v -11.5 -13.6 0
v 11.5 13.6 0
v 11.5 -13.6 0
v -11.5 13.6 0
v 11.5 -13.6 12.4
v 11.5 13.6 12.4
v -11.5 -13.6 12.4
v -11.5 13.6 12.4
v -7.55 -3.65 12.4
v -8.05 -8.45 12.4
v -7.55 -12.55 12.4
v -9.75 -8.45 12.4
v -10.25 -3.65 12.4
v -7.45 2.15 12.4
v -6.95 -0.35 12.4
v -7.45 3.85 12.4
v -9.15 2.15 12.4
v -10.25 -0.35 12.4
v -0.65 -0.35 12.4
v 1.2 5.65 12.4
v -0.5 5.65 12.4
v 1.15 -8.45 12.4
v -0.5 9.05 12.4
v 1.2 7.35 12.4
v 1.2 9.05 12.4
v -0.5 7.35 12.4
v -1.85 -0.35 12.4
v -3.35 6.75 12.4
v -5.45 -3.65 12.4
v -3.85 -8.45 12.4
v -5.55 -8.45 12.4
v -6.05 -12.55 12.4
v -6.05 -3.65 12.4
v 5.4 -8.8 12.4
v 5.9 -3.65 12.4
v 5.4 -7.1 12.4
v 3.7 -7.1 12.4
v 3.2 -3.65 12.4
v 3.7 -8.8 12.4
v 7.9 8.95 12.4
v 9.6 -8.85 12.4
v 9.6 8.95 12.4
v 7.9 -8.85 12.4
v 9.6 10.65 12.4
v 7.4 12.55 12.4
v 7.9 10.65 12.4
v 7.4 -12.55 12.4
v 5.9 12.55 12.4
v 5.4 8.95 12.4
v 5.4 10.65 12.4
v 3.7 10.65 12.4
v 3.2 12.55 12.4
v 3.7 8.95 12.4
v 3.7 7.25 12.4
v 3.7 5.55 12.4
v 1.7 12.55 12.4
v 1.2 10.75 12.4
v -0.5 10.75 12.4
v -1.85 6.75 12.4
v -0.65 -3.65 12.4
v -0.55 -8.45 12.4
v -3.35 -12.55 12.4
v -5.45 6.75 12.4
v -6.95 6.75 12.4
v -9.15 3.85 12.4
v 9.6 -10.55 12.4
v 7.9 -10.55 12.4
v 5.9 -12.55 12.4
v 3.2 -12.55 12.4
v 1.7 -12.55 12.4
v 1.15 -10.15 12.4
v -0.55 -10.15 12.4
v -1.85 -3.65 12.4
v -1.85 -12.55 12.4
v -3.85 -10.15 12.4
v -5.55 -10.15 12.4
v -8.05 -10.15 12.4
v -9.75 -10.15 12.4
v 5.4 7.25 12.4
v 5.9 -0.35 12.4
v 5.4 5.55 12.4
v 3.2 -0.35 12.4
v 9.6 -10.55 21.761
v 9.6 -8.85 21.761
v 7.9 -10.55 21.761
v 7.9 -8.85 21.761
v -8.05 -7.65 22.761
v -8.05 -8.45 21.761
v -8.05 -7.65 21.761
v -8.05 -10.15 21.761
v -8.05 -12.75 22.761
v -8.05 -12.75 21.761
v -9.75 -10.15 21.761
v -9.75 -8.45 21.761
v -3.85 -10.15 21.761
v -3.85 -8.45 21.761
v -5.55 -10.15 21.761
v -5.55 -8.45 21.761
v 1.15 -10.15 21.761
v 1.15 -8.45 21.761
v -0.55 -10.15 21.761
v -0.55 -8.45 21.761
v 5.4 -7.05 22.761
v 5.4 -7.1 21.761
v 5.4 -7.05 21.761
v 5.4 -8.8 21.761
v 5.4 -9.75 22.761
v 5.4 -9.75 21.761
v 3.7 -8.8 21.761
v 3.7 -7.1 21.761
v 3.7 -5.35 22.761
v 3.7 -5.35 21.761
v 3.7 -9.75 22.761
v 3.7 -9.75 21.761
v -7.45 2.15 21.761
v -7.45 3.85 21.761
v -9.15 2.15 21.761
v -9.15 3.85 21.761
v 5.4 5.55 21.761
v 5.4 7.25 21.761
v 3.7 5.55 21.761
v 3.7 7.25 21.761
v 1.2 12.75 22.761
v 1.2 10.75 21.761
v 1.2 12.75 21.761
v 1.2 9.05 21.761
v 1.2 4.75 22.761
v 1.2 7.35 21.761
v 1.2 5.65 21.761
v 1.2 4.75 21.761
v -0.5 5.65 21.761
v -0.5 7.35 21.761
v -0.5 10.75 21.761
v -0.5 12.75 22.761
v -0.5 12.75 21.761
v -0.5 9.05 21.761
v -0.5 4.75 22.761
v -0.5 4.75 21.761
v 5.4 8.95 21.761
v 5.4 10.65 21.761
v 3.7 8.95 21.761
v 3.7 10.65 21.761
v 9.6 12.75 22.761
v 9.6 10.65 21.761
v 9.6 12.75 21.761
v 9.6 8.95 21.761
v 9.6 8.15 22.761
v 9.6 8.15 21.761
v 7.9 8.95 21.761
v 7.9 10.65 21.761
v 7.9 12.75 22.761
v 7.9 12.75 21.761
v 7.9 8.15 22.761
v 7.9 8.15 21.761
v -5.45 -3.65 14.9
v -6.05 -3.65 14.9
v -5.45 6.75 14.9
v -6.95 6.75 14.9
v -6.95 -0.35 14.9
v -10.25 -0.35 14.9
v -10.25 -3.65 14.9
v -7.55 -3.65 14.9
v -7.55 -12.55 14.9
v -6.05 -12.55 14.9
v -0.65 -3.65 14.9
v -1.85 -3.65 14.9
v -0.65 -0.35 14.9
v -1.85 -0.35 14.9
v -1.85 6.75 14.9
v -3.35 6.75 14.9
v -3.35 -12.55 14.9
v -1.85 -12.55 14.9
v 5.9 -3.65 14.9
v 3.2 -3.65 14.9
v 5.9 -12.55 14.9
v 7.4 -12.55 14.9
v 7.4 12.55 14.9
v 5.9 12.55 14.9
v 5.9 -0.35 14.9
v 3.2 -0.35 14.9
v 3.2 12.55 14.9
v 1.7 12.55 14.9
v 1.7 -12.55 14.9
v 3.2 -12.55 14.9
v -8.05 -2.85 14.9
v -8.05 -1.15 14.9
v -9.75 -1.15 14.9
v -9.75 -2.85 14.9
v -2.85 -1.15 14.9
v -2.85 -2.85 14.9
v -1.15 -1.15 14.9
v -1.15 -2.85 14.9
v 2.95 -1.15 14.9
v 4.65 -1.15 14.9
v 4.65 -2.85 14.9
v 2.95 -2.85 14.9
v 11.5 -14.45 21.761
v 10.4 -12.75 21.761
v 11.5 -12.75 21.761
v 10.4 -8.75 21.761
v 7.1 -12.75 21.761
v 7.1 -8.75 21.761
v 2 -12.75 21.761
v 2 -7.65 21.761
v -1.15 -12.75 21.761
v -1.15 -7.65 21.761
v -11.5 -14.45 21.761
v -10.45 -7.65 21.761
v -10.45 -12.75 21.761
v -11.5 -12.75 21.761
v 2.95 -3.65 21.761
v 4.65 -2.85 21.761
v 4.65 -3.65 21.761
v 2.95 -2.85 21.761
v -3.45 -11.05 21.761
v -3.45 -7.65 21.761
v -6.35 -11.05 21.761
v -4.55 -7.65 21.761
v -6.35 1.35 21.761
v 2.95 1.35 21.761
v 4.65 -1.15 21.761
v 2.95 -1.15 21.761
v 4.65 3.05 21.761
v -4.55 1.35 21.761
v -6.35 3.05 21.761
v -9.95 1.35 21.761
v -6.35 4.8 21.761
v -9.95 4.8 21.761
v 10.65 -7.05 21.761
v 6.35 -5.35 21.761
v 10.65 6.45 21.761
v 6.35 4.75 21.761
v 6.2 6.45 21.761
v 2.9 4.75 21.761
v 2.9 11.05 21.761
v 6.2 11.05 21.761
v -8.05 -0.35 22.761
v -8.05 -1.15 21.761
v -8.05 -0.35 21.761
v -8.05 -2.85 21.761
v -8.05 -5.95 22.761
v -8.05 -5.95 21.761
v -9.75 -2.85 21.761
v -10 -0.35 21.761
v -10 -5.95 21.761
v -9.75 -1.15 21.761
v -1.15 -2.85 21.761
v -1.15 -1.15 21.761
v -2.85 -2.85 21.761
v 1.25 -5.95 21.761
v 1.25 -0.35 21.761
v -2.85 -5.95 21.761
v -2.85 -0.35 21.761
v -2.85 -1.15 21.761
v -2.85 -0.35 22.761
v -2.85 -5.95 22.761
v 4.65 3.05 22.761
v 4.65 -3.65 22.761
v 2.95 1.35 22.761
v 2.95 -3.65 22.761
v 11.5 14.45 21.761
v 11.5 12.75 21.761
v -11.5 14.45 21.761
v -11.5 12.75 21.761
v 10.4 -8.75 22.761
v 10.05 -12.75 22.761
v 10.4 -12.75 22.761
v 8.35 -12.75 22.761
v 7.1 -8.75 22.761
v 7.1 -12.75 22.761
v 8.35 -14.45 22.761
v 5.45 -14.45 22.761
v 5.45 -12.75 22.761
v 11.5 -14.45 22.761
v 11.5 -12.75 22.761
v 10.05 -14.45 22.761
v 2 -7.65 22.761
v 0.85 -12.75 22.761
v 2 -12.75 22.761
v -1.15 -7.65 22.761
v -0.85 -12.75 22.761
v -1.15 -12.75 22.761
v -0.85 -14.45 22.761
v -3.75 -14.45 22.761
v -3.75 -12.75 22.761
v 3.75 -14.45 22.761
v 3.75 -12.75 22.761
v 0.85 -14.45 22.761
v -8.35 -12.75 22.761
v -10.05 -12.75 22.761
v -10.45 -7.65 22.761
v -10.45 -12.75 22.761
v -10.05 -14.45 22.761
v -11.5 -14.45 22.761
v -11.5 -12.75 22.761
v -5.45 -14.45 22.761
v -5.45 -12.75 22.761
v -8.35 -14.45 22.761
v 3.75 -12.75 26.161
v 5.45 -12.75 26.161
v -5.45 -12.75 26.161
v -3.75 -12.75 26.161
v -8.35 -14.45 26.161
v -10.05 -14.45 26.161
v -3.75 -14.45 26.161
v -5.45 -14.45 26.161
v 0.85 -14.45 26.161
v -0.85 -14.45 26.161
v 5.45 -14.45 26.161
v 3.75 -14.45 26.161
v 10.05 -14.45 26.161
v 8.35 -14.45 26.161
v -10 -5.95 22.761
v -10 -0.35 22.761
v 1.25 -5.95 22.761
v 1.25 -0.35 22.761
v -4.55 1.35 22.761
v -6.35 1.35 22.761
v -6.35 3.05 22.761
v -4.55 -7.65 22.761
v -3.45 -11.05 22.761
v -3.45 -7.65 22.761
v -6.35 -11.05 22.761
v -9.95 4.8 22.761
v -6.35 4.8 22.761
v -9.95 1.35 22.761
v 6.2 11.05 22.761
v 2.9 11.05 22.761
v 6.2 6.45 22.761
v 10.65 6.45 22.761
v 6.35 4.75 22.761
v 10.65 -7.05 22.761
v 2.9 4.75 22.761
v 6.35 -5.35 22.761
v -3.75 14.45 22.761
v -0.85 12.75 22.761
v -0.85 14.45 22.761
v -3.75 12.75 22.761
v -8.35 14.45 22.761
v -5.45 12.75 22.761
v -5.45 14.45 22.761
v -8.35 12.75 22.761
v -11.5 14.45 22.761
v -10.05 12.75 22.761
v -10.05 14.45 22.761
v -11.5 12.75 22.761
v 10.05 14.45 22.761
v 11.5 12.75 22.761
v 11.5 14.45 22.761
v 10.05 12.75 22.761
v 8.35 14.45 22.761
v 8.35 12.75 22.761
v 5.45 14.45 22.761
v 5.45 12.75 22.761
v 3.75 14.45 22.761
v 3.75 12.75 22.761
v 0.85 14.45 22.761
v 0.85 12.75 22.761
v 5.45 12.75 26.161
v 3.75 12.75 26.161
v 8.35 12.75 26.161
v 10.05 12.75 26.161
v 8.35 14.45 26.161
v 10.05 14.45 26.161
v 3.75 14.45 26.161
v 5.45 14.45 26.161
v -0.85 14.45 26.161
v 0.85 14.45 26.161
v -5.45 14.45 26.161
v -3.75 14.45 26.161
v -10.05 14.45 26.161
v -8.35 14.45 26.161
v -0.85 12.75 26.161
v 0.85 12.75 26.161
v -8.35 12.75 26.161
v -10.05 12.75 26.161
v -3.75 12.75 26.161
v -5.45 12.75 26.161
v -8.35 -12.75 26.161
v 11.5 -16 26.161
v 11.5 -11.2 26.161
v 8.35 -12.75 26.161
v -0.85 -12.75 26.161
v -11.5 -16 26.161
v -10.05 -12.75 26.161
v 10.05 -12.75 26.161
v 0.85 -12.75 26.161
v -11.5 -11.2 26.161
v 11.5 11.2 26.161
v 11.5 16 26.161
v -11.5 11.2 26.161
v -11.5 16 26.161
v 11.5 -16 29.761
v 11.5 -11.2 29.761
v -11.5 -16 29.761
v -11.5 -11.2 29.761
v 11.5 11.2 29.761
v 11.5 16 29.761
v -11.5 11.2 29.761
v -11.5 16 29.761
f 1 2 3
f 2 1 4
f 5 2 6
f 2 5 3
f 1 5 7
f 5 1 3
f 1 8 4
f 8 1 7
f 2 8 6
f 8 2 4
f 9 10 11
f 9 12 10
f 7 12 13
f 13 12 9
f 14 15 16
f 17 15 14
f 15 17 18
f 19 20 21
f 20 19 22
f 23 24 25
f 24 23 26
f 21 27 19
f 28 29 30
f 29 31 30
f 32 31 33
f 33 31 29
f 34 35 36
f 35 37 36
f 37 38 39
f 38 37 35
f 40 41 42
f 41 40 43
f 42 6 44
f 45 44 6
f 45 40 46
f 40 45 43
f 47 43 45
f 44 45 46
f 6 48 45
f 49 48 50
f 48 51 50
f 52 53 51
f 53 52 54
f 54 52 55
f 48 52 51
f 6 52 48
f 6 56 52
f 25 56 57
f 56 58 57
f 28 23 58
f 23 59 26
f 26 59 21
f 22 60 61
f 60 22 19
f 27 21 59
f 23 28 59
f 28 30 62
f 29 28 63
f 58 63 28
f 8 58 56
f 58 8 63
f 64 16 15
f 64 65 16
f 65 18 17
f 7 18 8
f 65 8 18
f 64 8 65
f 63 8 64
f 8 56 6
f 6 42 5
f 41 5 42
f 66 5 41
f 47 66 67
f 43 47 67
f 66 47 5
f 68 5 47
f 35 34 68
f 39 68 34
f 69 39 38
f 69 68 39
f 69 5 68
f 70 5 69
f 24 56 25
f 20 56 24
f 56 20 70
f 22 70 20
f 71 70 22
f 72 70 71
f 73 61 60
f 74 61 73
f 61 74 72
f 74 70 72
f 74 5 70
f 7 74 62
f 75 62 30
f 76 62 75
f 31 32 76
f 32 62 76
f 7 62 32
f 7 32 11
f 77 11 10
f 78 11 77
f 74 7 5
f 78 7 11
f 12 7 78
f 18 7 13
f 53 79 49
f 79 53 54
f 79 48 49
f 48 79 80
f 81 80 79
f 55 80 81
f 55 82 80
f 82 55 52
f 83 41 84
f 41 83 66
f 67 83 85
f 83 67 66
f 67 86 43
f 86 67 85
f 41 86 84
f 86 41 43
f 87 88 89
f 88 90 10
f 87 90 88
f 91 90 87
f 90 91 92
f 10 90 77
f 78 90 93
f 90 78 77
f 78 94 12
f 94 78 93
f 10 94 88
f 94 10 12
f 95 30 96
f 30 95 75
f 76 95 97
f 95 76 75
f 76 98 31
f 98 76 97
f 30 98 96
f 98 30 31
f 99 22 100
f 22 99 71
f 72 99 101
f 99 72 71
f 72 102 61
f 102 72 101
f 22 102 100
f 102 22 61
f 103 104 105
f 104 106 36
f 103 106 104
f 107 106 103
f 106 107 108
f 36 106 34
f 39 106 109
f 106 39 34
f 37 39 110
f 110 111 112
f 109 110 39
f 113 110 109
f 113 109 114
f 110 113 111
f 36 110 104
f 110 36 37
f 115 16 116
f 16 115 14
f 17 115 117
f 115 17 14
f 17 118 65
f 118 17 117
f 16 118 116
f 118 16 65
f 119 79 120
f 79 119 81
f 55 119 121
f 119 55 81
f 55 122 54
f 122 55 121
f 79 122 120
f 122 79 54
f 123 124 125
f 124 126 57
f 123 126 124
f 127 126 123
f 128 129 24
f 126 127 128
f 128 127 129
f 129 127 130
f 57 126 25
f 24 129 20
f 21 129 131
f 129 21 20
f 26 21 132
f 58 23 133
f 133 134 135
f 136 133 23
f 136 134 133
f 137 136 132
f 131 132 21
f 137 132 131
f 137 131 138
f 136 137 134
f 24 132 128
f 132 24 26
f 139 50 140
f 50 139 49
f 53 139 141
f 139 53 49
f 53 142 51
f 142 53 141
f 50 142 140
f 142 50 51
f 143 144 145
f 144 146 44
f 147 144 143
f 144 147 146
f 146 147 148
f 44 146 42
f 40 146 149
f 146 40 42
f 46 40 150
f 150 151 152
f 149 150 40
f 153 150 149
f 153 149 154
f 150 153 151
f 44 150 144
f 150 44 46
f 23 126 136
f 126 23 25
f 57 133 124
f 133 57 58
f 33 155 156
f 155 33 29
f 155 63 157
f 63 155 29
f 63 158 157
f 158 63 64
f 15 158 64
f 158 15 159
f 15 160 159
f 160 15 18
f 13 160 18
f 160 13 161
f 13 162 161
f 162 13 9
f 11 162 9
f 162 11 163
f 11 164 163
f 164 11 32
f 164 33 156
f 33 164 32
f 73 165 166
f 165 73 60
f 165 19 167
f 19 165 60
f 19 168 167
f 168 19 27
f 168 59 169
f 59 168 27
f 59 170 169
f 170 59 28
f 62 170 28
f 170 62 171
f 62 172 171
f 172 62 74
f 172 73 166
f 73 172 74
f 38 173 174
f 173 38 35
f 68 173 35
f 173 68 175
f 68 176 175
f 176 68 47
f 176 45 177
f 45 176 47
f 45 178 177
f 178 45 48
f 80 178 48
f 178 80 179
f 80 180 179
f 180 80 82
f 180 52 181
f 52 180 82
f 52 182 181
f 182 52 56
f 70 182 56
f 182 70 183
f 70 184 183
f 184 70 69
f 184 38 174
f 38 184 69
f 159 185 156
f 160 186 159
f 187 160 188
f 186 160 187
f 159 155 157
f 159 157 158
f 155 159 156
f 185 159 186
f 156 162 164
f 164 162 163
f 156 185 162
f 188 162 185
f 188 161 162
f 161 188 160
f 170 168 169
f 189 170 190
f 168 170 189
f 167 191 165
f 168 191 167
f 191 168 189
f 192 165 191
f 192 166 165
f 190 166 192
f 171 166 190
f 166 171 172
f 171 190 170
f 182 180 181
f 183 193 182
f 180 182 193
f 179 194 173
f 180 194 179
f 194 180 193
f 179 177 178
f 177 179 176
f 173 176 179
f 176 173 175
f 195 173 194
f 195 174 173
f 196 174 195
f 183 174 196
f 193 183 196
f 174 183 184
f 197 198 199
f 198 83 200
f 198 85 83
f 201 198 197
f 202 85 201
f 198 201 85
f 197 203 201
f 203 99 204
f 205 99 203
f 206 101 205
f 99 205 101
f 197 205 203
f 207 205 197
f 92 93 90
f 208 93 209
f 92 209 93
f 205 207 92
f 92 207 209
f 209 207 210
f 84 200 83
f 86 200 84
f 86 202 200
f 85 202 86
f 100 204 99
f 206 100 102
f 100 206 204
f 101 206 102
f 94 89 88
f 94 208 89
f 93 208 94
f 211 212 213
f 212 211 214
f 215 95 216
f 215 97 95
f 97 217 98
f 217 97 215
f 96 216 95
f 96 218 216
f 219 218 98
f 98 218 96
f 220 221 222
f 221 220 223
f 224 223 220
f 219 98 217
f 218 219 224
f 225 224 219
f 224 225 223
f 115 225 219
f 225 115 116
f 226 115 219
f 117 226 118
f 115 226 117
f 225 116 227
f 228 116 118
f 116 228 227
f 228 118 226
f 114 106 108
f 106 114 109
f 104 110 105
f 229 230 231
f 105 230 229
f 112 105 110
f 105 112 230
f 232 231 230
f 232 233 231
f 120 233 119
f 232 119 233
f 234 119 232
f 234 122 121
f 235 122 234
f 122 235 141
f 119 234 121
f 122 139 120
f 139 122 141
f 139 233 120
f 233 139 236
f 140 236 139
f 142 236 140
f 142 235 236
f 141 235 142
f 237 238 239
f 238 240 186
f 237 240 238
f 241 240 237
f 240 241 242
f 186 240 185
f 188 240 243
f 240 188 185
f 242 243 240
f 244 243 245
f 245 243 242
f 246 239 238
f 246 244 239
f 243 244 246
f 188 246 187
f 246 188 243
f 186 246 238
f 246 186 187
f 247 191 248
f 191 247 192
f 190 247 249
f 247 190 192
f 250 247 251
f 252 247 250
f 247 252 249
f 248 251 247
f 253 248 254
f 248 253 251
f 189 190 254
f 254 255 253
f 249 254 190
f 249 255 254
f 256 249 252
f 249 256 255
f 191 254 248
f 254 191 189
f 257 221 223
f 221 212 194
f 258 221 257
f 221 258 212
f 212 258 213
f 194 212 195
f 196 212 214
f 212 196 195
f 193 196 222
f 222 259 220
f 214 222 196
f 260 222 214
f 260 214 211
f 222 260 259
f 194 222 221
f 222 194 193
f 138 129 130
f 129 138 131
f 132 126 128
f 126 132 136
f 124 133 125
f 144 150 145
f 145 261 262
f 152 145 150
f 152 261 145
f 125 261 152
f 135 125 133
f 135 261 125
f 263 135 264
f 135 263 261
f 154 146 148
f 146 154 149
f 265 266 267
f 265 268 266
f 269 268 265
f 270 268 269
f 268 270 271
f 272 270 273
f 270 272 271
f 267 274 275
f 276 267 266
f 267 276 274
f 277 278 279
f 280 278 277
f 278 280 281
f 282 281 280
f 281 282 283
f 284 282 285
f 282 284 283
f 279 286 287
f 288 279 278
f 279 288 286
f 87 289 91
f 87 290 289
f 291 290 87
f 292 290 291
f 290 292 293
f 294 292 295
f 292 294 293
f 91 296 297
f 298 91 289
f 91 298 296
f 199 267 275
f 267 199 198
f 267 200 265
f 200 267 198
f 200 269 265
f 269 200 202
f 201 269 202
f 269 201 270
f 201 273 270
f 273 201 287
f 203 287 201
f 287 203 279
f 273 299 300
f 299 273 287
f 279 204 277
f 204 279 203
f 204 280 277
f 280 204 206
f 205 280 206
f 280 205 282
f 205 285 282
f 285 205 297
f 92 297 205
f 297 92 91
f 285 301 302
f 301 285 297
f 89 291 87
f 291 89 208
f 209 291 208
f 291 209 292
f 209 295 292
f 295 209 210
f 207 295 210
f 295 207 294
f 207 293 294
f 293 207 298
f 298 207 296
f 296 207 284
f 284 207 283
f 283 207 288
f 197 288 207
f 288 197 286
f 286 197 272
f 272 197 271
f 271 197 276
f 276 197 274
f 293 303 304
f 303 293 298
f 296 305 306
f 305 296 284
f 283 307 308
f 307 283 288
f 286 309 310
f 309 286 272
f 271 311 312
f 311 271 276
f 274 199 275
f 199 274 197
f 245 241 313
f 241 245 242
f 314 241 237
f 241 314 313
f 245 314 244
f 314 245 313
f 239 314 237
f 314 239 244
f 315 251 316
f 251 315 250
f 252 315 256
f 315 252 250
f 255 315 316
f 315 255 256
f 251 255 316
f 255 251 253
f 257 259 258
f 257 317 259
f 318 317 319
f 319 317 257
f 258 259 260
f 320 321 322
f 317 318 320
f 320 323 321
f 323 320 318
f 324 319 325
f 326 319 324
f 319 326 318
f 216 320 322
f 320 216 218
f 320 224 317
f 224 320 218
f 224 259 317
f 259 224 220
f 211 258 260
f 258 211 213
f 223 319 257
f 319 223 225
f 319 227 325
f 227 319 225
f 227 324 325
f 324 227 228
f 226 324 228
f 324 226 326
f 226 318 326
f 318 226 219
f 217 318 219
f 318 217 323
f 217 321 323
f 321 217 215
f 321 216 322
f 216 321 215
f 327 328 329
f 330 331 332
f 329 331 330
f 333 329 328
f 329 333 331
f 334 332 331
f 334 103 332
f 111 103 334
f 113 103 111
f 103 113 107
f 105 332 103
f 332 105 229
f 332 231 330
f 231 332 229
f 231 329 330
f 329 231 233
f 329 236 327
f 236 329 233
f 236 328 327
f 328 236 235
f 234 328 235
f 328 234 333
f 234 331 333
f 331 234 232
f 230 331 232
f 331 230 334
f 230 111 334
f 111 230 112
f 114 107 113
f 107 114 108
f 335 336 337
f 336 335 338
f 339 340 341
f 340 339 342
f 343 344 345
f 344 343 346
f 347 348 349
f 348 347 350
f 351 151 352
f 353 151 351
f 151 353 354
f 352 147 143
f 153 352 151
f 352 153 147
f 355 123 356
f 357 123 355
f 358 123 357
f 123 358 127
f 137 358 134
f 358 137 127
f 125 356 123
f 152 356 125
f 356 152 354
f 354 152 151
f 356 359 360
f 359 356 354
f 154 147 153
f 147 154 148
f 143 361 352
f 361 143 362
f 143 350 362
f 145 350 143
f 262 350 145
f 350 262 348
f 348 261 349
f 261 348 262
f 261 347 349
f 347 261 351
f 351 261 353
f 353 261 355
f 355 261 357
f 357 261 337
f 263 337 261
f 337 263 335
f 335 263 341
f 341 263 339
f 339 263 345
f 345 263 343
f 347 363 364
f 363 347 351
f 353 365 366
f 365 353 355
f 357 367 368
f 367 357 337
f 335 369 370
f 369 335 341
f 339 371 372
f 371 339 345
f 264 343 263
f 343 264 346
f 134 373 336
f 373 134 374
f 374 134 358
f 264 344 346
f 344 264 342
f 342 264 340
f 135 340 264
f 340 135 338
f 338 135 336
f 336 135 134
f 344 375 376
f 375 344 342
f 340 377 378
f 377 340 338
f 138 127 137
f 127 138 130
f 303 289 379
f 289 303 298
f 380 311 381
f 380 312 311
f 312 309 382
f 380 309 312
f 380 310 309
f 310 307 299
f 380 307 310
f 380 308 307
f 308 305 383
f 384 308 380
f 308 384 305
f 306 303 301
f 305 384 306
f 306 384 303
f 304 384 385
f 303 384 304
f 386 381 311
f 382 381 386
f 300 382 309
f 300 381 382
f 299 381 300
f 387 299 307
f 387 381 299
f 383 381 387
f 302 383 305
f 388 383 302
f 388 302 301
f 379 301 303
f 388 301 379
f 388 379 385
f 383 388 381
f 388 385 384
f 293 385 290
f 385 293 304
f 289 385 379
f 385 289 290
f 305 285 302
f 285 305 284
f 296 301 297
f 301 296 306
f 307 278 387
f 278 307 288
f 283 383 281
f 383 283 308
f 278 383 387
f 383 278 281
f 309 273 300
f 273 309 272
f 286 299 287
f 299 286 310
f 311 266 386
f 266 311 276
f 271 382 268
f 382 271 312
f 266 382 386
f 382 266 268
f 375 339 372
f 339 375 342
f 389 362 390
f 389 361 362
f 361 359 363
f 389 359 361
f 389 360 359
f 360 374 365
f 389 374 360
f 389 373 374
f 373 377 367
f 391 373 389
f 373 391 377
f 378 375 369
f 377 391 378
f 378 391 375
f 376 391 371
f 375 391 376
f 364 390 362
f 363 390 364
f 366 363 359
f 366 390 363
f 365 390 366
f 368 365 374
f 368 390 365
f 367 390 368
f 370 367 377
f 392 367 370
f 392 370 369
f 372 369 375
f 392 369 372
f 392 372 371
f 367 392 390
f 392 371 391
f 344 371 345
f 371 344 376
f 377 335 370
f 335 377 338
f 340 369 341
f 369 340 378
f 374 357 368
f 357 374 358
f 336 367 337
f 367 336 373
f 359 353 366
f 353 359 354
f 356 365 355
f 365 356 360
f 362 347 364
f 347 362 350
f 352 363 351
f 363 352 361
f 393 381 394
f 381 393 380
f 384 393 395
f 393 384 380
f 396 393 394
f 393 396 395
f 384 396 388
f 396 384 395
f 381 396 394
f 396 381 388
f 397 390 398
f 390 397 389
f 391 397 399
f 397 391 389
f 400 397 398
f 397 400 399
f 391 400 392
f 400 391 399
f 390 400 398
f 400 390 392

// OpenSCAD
// Generated by SolidPython 0.4.2 on 2020-09-29 23:22:10
//!OpenSCAD

scale(v = 0.0100000000) {
	translate(v = [-1150, -1360, 0]) {
		union() {
			color(c = [0.4000000000, 0.4000000000, 0.4000000000]) {
				translate(v = [0, 0, 0]) {
					linear_extrude(height = 1000.0000000000) {
						polygon(paths = [[0, 1, 2, 3]], points = [[0, 0], [0, 2720], [2300, 2720], [2300, 0]]);
					}
				}
			}
			color(c = [0.2000000000, 0.6000000000, 0.2000000000]) {
				translate(v = [0, 0, 1000.0000000000]) {
					linear_extrude(height = 120.0000000000) {
						polygon(paths = [[0, 1, 2, 3]], points = [[0, 1305], [0, 2720], [2300, 2720], [2300, 1305]]);
					}
				}
			}
			color(c = [0.4000000000, 0.4000000000, 0.4000000000]) {
				translate(v = [0, 0, 1000.0000000000]) {
					linear_extrude(height = 120.0000000000) {
						polygon(paths = [[0, 1, 2, 3]], points = [[0, 0], [0, 1305], [2300, 1305], [2300, 0]]);
					}
				}
			}
			color(c = [0.9000000000, 0.6000000000, 0.6000000000]) {
				translate(v = [0, 0, 1120.0000000000]) {
					linear_extrude(height = 120.0000000000) {
						polygon(paths = [[0, 1, 2, 3]], points = [[195, 1485], [195, 1905], [455, 1905], [455, 1485]]);
					}
				}
			}
			color(c = [0.9000000000, 0.6000000000, 0.6000000000]) {
				translate(v = [0, 0, 1120.0000000000]) {
					linear_extrude(height = 120.0000000000) {
						polygon(paths = [[0, 1, 2, 3]], points = [[605, 1485], [605, 1905], [815, 1905], [815, 1485]]);
					}
				}
			}
			color(c = [0.9000000000, 0.6000000000, 0.6000000000]) {
				translate(v = [0, 0, 1120.0000000000]) {
					linear_extrude(height = 120.0000000000) {
						polygon(paths = [[0, 1, 2, 3, 4, 5]], points = [[965, 1485], [965, 1905], [1040, 1905], [1040, 2485], [1320, 2485], [1320, 1485]]);
					}
				}
			}
			color(c = [0.9000000000, 0.6000000000, 0.6000000000]) {
				translate(v = [0, 0, 1120.0000000000]) {
					linear_extrude(height = 120.0000000000) {
						polygon(paths = [[0, 1, 2, 3]], points = [[1470, 1485], [1470, 2485], [1740, 2485], [1740, 1485]]);
					}
				}
			}
			color(c = [0.9000000000, 0.6000000000, 0.6000000000]) {
				translate(v = [0, 0, 1120.0000000000]) {
					linear_extrude(height = 120.0000000000) {
						polygon(paths = [[0, 1, 2, 3]], points = [[1890, 1485], [1890, 2485], [2150, 2485], [2150, 1485]]);
					}
				}
			}
			color(c = [0.9000000000, 0.6000000000, 0.9000000000]) {
				translate(v = [0, 0, 1120.0000000000]) {
					linear_extrude(height = 120.0000000000) {
						polygon(paths = [[0, 1, 2, 3]], points = [[135, 235], [135, 655], [395, 655], [395, 235]]);
					}
				}
			}
			color(c = [0.9000000000, 0.6000000000, 0.9000000000]) {
				translate(v = [0, 0, 1120.0000000000]) {
					linear_extrude(height = 120.0000000000) {
						polygon(paths = [[0, 1, 2, 3]], points = [[545, 235], [545, 655], [815, 655], [815, 235]]);
					}
				}
			}
			color(c = [0.9000000000, 0.6000000000, 0.9000000000]) {
				translate(v = [0, 0, 1120.0000000000]) {
					linear_extrude(height = 120.0000000000) {
						polygon(paths = [[0, 1, 2, 3, 4, 5]], points = [[965, 235], [965, 655], [1040, 655], [1040, 885], [1320, 885], [1320, 235]]);
					}
				}
			}
			color(c = [0.9000000000, 0.6000000000, 0.9000000000]) {
				translate(v = [0, 0, 1120.0000000000]) {
					linear_extrude(height = 120.0000000000) {
						polygon(paths = [[0, 1, 2, 3]], points = [[1470, 235], [1470, 885], [1740, 885], [1740, 235]]);
					}
				}
			}
			color(c = [0.9000000000, 0.6000000000, 0.9000000000]) {
				translate(v = [0, 0, 1120.0000000000]) {
					linear_extrude(height = 120.0000000000) {
						polygon(paths = [[0, 1, 2, 3]], points = [[1890, 235], [1890, 885], [2150, 885], [2150, 235]]);
					}
				}
			}
			color(c = [0.2000000000, 0.6000000000, 0.2000000000]) {
				translate(v = [0, 0, 1120.0000000000]) {
					linear_extrude(height = 120.0000000000) {
						difference() {
							polygon(paths = [[0, 1, 2, 3]], points = [[0, 1305], [0, 2720], [2300, 2720], [2300, 1305]]);
							polygon(paths = [[0, 1, 2, 3]], points = [[195, 1485], [455, 1485], [455, 1905], [195, 1905]]);
							polygon(paths = [[0, 1, 2, 3]], points = [[605, 1485], [815, 1485], [815, 1905], [605, 1905]]);
							polygon(paths = [[0, 1, 2, 3]], points = [[1470, 1485], [1740, 1485], [1740, 2485], [1470, 2485]]);
							polygon(paths = [[0, 1, 2, 3]], points = [[1890, 1485], [2150, 1485], [2150, 2485], [1890, 2485]]);
							polygon(paths = [[0, 1, 2, 3, 4, 5]], points = [[965, 1485], [1320, 1485], [1320, 2485], [1040, 2485], [1040, 1905], [965, 1905]]);
						}
					}
				}
			}
			color(c = [0.4000000000, 0.4000000000, 0.4000000000]) {
				translate(v = [0, 0, 1120.0000000000]) {
					linear_extrude(height = 120.0000000000) {
						difference() {
							polygon(paths = [[0, 1, 2, 3]], points = [[0, 0], [0, 1305], [2300, 1305], [2300, 0]]);
							polygon(paths = [[0, 1, 2, 3]], points = [[135, 235], [395, 235], [395, 655], [135, 655]]);
							polygon(paths = [[0, 1, 2, 3]], points = [[545, 235], [815, 235], [815, 655], [545, 655]]);
							polygon(paths = [[0, 1, 2, 3]], points = [[1470, 235], [1740, 235], [1740, 885], [1470, 885]]);
							polygon(paths = [[0, 1, 2, 3]], points = [[1890, 235], [2150, 235], [2150, 885], [1890, 885]]);
							polygon(paths = [[0, 1, 2, 3, 4, 5]], points = [[965, 235], [1320, 235], [1320, 885], [1040, 885], [1040, 655], [965, 655]]);
						}
					}
				}
			}
			color(c = [0.1000000000, 0.1000000000, 0.1000000000]) {
				translate(v = [0, 0, 1240.0000000000]) {
					linear_extrude(height = 70.0000000000) {
						polygon(paths = [[0, 1, 2, 3]], points = [[1940, 305], [1940, 475], [2110, 475], [2110, 305]]);
					}
				}
			}
			color(c = [0.1000000000, 0.1000000000, 0.1000000000]) {
				translate(v = [0, 0, 1240.0000000000]) {
					linear_extrude(height = 70.0000000000) {
						polygon(paths = [[0, 1, 2, 3]], points = [[175, 345], [175, 515], [345, 515], [345, 345]]);
					}
				}
			}
			color(c = [0.1000000000, 0.1000000000, 0.1000000000]) {
				translate(v = [0, 0, 1240.0000000000]) {
					linear_extrude(height = 70.0000000000) {
						polygon(paths = [[0, 1, 2, 3]], points = [[595, 345], [595, 515], [765, 515], [765, 345]]);
					}
				}
			}
			color(c = [0.1000000000, 0.1000000000, 0.1000000000]) {
				translate(v = [0, 0, 1240.0000000000]) {
					linear_extrude(height = 70.0000000000) {
						polygon(paths = [[0, 1, 2, 3]], points = [[1095, 345], [1095, 515], [1265, 515], [1265, 345]]);
					}
				}
			}
			color(c = [0.1000000000, 0.1000000000, 0.1000000000]) {
				translate(v = [0, 0, 1240.0000000000]) {
					linear_extrude(height = 70.0000000000) {
						polygon(paths = [[0, 1, 2, 3]], points = [[1520, 480], [1520, 650], [1690, 650], [1690, 480]]);
					}
				}
			}
			color(c = [0.1000000000, 0.1000000000, 0.1000000000]) {
				translate(v = [0, 0, 1240.0000000000]) {
					linear_extrude(height = 70.0000000000) {
						polygon(paths = [[0, 1, 2, 3]], points = [[235, 1575], [235, 1745], [405, 1745], [405, 1575]]);
					}
				}
			}
			color(c = [0.1000000000, 0.1000000000, 0.1000000000]) {
				translate(v = [0, 0, 1240.0000000000]) {
					linear_extrude(height = 70.0000000000) {
						polygon(paths = [[0, 1, 2, 3]], points = [[1520, 1915], [1520, 2085], [1690, 2085], [1690, 1915]]);
					}
				}
			}
			color(c = [0.1000000000, 0.1000000000, 0.1000000000]) {
				translate(v = [0, 0, 1240.0000000000]) {
					linear_extrude(height = 70.0000000000) {
						polygon(paths = [[0, 1, 2, 3]], points = [[1100, 1925], [1100, 2095], [1270, 2095], [1270, 1925]]);
					}
				}
			}
			color(c = [0.1000000000, 0.1000000000, 0.1000000000]) {
				translate(v = [0, 0, 1240.0000000000]) {
					linear_extrude(height = 70.0000000000) {
						polygon(paths = [[0, 1, 2, 3]], points = [[1520, 2255], [1520, 2425], [1690, 2425], [1690, 2255]]);
					}
				}
			}
			color(c = [0.1000000000, 0.1000000000, 0.1000000000]) {
				translate(v = [0, 0, 1240.0000000000]) {
					linear_extrude(height = 70.0000000000) {
						polygon(paths = [[0, 1, 2, 3]], points = [[1940, 2255], [1940, 2425], [2110, 2425], [2110, 2255]]);
					}
				}
			}
			color(c = [0.1000000000, 0.1000000000, 0.1000000000]) {
				translate(v = [0, 0, 1240.0000000000]) {
					linear_extrude(height = 70.0000000000) {
						polygon(paths = [[0, 1, 2, 3]], points = [[1100, 2265], [1100, 2435], [1270, 2435], [1270, 2265]]);
					}
				}
			}
			color(c = [1.0000000000, 1.0000000000, 1.0000000000]) {
				translate(v = [0, 0, 1240.0000000000]) {
					linear_extrude(height = 70.0000000000) {
						polygon(paths = [[0, 1, 2, 3, 4, 5, 6, 7, 8, 9]], points = [[395, 105], [395, 995], [125, 995], [125, 1325], [455, 1325], [455, 2035], [605, 2035], [605, 995], [545, 995], [545, 105]]);
					}
				}
			}
			color(c = [1.0000000000, 1.0000000000, 1.0000000000]) {
				translate(v = [0, 0, 1240.0000000000]) {
					linear_extrude(height = 70.0000000000) {
						polygon(paths = [[0, 1, 2, 3, 4, 5, 6, 7]], points = [[815, 105], [815, 2035], [965, 2035], [965, 1325], [1085, 1325], [1085, 995], [965, 995], [965, 105]]);
					}
				}
			}
			color(c = [1.0000000000, 1.0000000000, 1.0000000000]) {
				translate(v = [0, 0, 1240.0000000000]) {
					linear_extrude(height = 70.0000000000) {
						polygon(paths = [[0, 1, 2, 3, 4, 5, 6, 7, 8, 9, 10, 11]], points = [[1320, 105], [1320, 2615], [1470, 2615], [1470, 1325], [1740, 1325], [1740, 2615], [1890, 2615], [1890, 105], [1740, 105], [1740, 995], [1470, 995], [1470, 105]]);
					}
				}
			}
			color(c = [0.1000000000, 0.1000000000, 0.1000000000]) {
				translate(v = [0, 0, 1310.0000000000]) {
					linear_extrude(height = 180.0000000000) {
						polygon(paths = [[0, 1, 2, 3]], points = [[1940, 305], [1940, 475], [2110, 475], [2110, 305]]);
					}
				}
			}
			color(c = [0.1000000000, 0.1000000000, 0.1000000000]) {
				translate(v = [0, 0, 1310.0000000000]) {
					linear_extrude(height = 180.0000000000) {
						polygon(paths = [[0, 1, 2, 3]], points = [[175, 345], [175, 515], [345, 515], [345, 345]]);
					}
				}
			}
			color(c = [0.1000000000, 0.1000000000, 0.1000000000]) {
				translate(v = [0, 0, 1310.0000000000]) {
					linear_extrude(height = 180.0000000000) {
						polygon(paths = [[0, 1, 2, 3]], points = [[595, 345], [595, 515], [765, 515], [765, 345]]);
					}
				}
			}
			color(c = [0.1000000000, 0.1000000000, 0.1000000000]) {
				translate(v = [0, 0, 1310.0000000000]) {
					linear_extrude(height = 180.0000000000) {
						polygon(paths = [[0, 1, 2, 3]], points = [[1095, 345], [1095, 515], [1265, 515], [1265, 345]]);
					}
				}
			}
			color(c = [0.1000000000, 0.1000000000, 0.1000000000]) {
				translate(v = [0, 0, 1310.0000000000]) {
					linear_extrude(height = 180.0000000000) {
						polygon(paths = [[0, 1, 2, 3]], points = [[1520, 480], [1520, 650], [1690, 650], [1690, 480]]);
					}
				}
			}
			color(c = [0.1000000000, 0.1000000000, 0.1000000000]) {
				translate(v = [0, 0, 1310.0000000000]) {
					linear_extrude(height = 180.0000000000) {
						polygon(paths = [[0, 1, 2, 3]], points = [[235, 1575], [235, 1745], [405, 1745], [405, 1575]]);
					}
				}
			}
			color(c = [0.1000000000, 0.1000000000, 0.1000000000]) {
				translate(v = [0, 0, 1310.0000000000]) {
					linear_extrude(height = 180.0000000000) {
						polygon(paths = [[0, 1, 2, 3]], points = [[1520, 1915], [1520, 2085], [1690, 2085], [1690, 1915]]);
					}
				}
			}
			color(c = [0.1000000000, 0.1000000000, 0.1000000000]) {
				translate(v = [0, 0, 1310.0000000000]) {
					linear_extrude(height = 180.0000000000) {
						polygon(paths = [[0, 1, 2, 3]], points = [[1100, 1925], [1100, 2095], [1270, 2095], [1270, 1925]]);
					}
				}
			}
			color(c = [0.1000000000, 0.1000000000, 0.1000000000]) {
				translate(v = [0, 0, 1310.0000000000]) {
					linear_extrude(height = 180.0000000000) {
						polygon(paths = [[0, 1, 2, 3]], points = [[1520, 2255], [1520, 2425], [1690, 2425], [1690, 2255]]);
					}
				}
			}
			color(c = [0.1000000000, 0.1000000000, 0.1000000000]) {
				translate(v = [0, 0, 1310.0000000000]) {
					linear_extrude(height = 180.0000000000) {
						polygon(paths = [[0, 1, 2, 3]], points = [[1940, 2255], [1940, 2425], [2110, 2425], [2110, 2255]]);
					}
				}
			}
			color(c = [0.1000000000, 0.1000000000, 0.1000000000]) {
				translate(v = [0, 0, 1310.0000000000]) {
					linear_extrude(height = 180.0000000000) {
						polygon(paths = [[0, 1, 2, 3]], points = [[1100, 2265], [1100, 2435], [1270, 2435], [1270, 2265]]);
					}
				}
			}
			color(c = [0.7000000000, 0, 0]) {
				translate(v = [0, 0, 1310.0000000000]) {
					linear_extrude(height = 180.0000000000) {
						polygon(paths = [[0, 1, 2, 3, 4, 5, 6, 7, 8, 9]], points = [[395, 105], [395, 995], [125, 995], [125, 1325], [455, 1325], [455, 2035], [605, 2035], [605, 995], [545, 995], [545, 105]]);
					}
				}
			}
			color(c = [0.7000000000, 0, 0]) {
				translate(v = [0, 0, 1310.0000000000]) {
					linear_extrude(height = 180.0000000000) {
						polygon(paths = [[0, 1, 2, 3, 4, 5, 6, 7]], points = [[815, 105], [815, 2035], [965, 2035], [965, 1325], [1085, 1325], [1085, 995], [965, 995], [965, 105]]);
					}
				}
			}
			color(c = [0.7000000000, 0, 0]) {
				translate(v = [0, 0, 1310.0000000000]) {
					linear_extrude(height = 180.0000000000) {
						polygon(paths = [[0, 1, 2, 3, 4, 5, 6, 7, 8, 9, 10, 11]], points = [[1320, 105], [1320, 2615], [1470, 2615], [1470, 1325], [1740, 1325], [1740, 2615], [1890, 2615], [1890, 105], [1740, 105], [1740, 995], [1470, 995], [1470, 105]]);
					}
				}
			}
			color(c = [0.1000000000, 0.1000000000, 0.1000000000]) {
				translate(v = [0, 0, 1490.0000000000]) {
					linear_extrude(height = 686.1000000000) {
						polygon(paths = [[0, 1, 2, 3]], points = [[1940, 305], [1940, 475], [2110, 475], [2110, 305]]);
					}
				}
			}
			color(c = [0.1000000000, 0.1000000000, 0.1000000000]) {
				translate(v = [0, 0, 1490.0000000000]) {
					linear_extrude(height = 686.1000000000) {
						polygon(paths = [[0, 1, 2, 3]], points = [[175, 345], [175, 515], [345, 515], [345, 345]]);
					}
				}
			}
			color(c = [0.1000000000, 0.1000000000, 0.1000000000]) {
				translate(v = [0, 0, 1490.0000000000]) {
					linear_extrude(height = 686.1000000000) {
						polygon(paths = [[0, 1, 2, 3]], points = [[595, 345], [595, 515], [765, 515], [765, 345]]);
					}
				}
			}
			color(c = [0.1000000000, 0.1000000000, 0.1000000000]) {
				translate(v = [0, 0, 1490.0000000000]) {
					linear_extrude(height = 686.1000000000) {
						polygon(paths = [[0, 1, 2, 3]], points = [[1095, 345], [1095, 515], [1265, 515], [1265, 345]]);
					}
				}
			}
			color(c = [0.1000000000, 0.1000000000, 0.1000000000]) {
				translate(v = [0, 0, 1490.0000000000]) {
					linear_extrude(height = 686.1000000000) {
						polygon(paths = [[0, 1, 2, 3]], points = [[1520, 480], [1520, 650], [1690, 650], [1690, 480]]);
					}
				}
			}
			color(c = [0.1000000000, 0.1000000000, 0.1000000000]) {
				translate(v = [0, 0, 1490.0000000000]) {
					linear_extrude(height = 686.1000000000) {
						polygon(paths = [[0, 1, 2, 3]], points = [[175, 1075], [175, 1245], [345, 1245], [345, 1075]]);
					}
				}
			}
			color(c = [0.1000000000, 0.1000000000, 0.1000000000]) {
				translate(v = [0, 0, 1490.0000000000]) {
					linear_extrude(height = 686.1000000000) {
						polygon(paths = [[0, 1, 2, 3]], points = [[865, 1075], [865, 1245], [1035, 1245], [1035, 1075]]);
					}
				}
			}
			color(c = [0.1000000000, 0.1000000000, 0.1000000000]) {
				translate(v = [0, 0, 1490.0000000000]) {
					linear_extrude(height = 686.1000000000) {
						polygon(paths = [[0, 1, 2, 3]], points = [[1445, 1075], [1445, 1245], [1615, 1245], [1615, 1075]]);
					}
				}
			}
			color(c = [0.1000000000, 0.1000000000, 0.1000000000]) {
				translate(v = [0, 0, 1490.0000000000]) {
					linear_extrude(height = 686.1000000000) {
						polygon(paths = [[0, 1, 2, 3]], points = [[235, 1575], [235, 1745], [405, 1745], [405, 1575]]);
					}
				}
			}
			color(c = [0.1000000000, 0.1000000000, 0.1000000000]) {
				translate(v = [0, 0, 1490.0000000000]) {
					linear_extrude(height = 686.1000000000) {
						polygon(paths = [[0, 1, 2, 3]], points = [[1520, 1915], [1520, 2085], [1690, 2085], [1690, 1915]]);
					}
				}
			}
			color(c = [0.1000000000, 0.1000000000, 0.1000000000]) {
				translate(v = [0, 0, 1490.0000000000]) {
					linear_extrude(height = 686.1000000000) {
						polygon(paths = [[0, 1, 2, 3]], points = [[1100, 1925], [1100, 2095], [1270, 2095], [1270, 1925]]);
					}
				}
			}
			color(c = [0.1000000000, 0.1000000000, 0.1000000000]) {
				translate(v = [0, 0, 1490.0000000000]) {
					linear_extrude(height = 686.1000000000) {
						polygon(paths = [[0, 1, 2, 3]], points = [[1520, 2255], [1520, 2425], [1690, 2425], [1690, 2255]]);
					}
				}
			}
			color(c = [0.1000000000, 0.1000000000, 0.1000000000]) {
				translate(v = [0, 0, 1490.0000000000]) {
					linear_extrude(height = 686.1000000000) {
						polygon(paths = [[0, 1, 2, 3]], points = [[1940, 2255], [1940, 2425], [2110, 2425], [2110, 2255]]);
					}
				}
			}
			color(c = [0.1000000000, 0.1000000000, 0.1000000000]) {
				translate(v = [0, 0, 1490.0000000000]) {
					linear_extrude(height = 686.1000000000) {
						polygon(paths = [[0, 1, 2, 3]], points = [[1100, 2265], [1100, 2435], [1270, 2435], [1270, 2265]]);
					}
				}
			}
			color(c = [0.9000000000, 0.6000000000, 0.6000000000]) {
				translate(v = [0, 0, 2176.1000000000]) {
					linear_extrude(height = 100.0000000000) {
						polygon(paths = [[0, 1, 2, 3, 4, 5, 6, 7, 8, 9, 10, 11, 12, 13, 14, 15]], points = [[0, -85], [0, 85], [105, 85], [105, 595], [345, 595], [345, 85], [1035, 85], [1035, 595], [1350, 595], [1350, 85], [1860, 85], [1860, 485], [2190, 485], [2190, 85], [2300, 85], [2300, -85]]);
					}
				}
			}
			color(c = [0.9000000000, 0.6000000000, 0.6000000000]) {
				translate(v = [0, 0, 2176.1000000000]) {
					linear_extrude(height = 100.0000000000) {
						polygon(paths = [[0, 1, 2, 3]], points = [[150, 765], [150, 1325], [345, 1325], [345, 765]]);
					}
				}
			}
			color(c = [0.9000000000, 0.6000000000, 0.6000000000]) {
				translate(v = [0, 0, 2176.1000000000]) {
					linear_extrude(height = 100.0000000000) {
						polygon(paths = [[0, 1, 2, 3]], points = [[865, 765], [865, 1325], [1275, 1325], [1275, 765]]);
					}
				}
			}
			color(c = [0.9000000000, 0.6000000000, 0.6000000000]) {
				translate(v = [0, 0, 2176.1000000000]) {
					linear_extrude(height = 100.0000000000) {
						polygon(paths = [[0, 1, 2, 3, 4, 5, 6, 7, 8, 9, 10, 11, 12, 13]], points = [[515, 255], [515, 1495], [155, 1495], [155, 1840], [515, 1840], [515, 1665], [1615, 1665], [1615, 995], [1445, 995], [1445, 1495], [695, 1495], [695, 595], [805, 595], [805, 255]]);
					}
				}
			}
			color(c = [0.9000000000, 0.6000000000, 0.6000000000]) {
				translate(v = [0, 0, 2176.1000000000]) {
					linear_extrude(height = 100.0000000000) {
						polygon(paths = [[0, 1, 2, 3, 4, 5, 6, 7, 8, 9, 10, 11]], points = [[1520, 385], [1520, 825], [1785, 825], [1785, 1835], [1440, 1835], [1440, 2465], [1770, 2465], [1770, 2005], [2215, 2005], [2215, 655], [1690, 655], [1690, 385]]);
					}
				}
			}
			color(c = [0.9000000000, 0.6000000000, 0.6000000000]) {
				translate(v = [0, 0, 2176.1000000000]) {
					linear_extrude(height = 100.0000000000) {
						polygon(paths = [[0, 1, 2, 3, 4, 5, 6, 7, 8, 9, 10, 11]], points = [[1100, 1835], [1100, 2635], [0, 2635], [0, 2805], [2300, 2805], [2300, 2635], [2110, 2635], [2110, 2175], [1940, 2175], [1940, 2635], [1270, 2635], [1270, 1835]]);
					}
				}
			}
			color(c = [0.5000000000, 0.5000000000, 0.5000000000]) {
				translate(v = [0, 0, 2276.1000000000]) {
					linear_extrude(height = 340.0000000000) {
						polygon(paths = [[0, 1, 2, 3]], points = [[145, -85], [145, 85], [315, 85], [315, -85]]);
					}
				}
			}
			color(c = [0.5000000000, 0.5000000000, 0.5000000000]) {
				translate(v = [0, 0, 2276.1000000000]) {
					linear_extrude(height = 340.0000000000) {
						polygon(paths = [[0, 1, 2, 3]], points = [[605, -85], [605, 85], [775, 85], [775, -85]]);
					}
				}
			}
			color(c = [0.5000000000, 0.5000000000, 0.5000000000]) {
				translate(v = [0, 0, 2276.1000000000]) {
					linear_extrude(height = 340.0000000000) {
						polygon(paths = [[0, 1, 2, 3]], points = [[1065, -85], [1065, 85], [1235, 85], [1235, -85]]);
					}
				}
			}
			color(c = [0.5000000000, 0.5000000000, 0.5000000000]) {
				translate(v = [0, 0, 2276.1000000000]) {
					linear_extrude(height = 340.0000000000) {
						polygon(paths = [[0, 1, 2, 3]], points = [[1525, -85], [1525, 85], [1695, 85], [1695, -85]]);
					}
				}
			}
			color(c = [0.5000000000, 0.5000000000, 0.5000000000]) {
				translate(v = [0, 0, 2276.1000000000]) {
					linear_extrude(height = 340.0000000000) {
						polygon(paths = [[0, 1, 2, 3]], points = [[1985, -85], [1985, 85], [2155, 85], [2155, -85]]);
					}
				}
			}
			color(c = [0.5000000000, 0.5000000000, 0.5000000000]) {
				translate(v = [0, 0, 2276.1000000000]) {
					linear_extrude(height = 340.0000000000) {
						polygon(paths = [[0, 1, 2, 3]], points = [[145, 2635], [145, 2805], [315, 2805], [315, 2635]]);
					}
				}
			}
			color(c = [0.5000000000, 0.5000000000, 0.5000000000]) {
				translate(v = [0, 0, 2276.1000000000]) {
					linear_extrude(height = 340.0000000000) {
						polygon(paths = [[0, 1, 2, 3]], points = [[605, 2635], [605, 2805], [775, 2805], [775, 2635]]);
					}
				}
			}
			color(c = [0.5000000000, 0.5000000000, 0.5000000000]) {
				translate(v = [0, 0, 2276.1000000000]) {
					linear_extrude(height = 340.0000000000) {
						polygon(paths = [[0, 1, 2, 3]], points = [[1065, 2635], [1065, 2805], [1235, 2805], [1235, 2635]]);
					}
				}
			}
			color(c = [0.5000000000, 0.5000000000, 0.5000000000]) {
				translate(v = [0, 0, 2276.1000000000]) {
					linear_extrude(height = 340.0000000000) {
						polygon(paths = [[0, 1, 2, 3]], points = [[1525, 2635], [1525, 2805], [1695, 2805], [1695, 2635]]);
					}
				}
			}
			color(c = [0.5000000000, 0.5000000000, 0.5000000000]) {
				translate(v = [0, 0, 2276.1000000000]) {
					linear_extrude(height = 340.0000000000) {
						polygon(paths = [[0, 1, 2, 3]], points = [[1985, 2635], [1985, 2805], [2155, 2805], [2155, 2635]]);
					}
				}
			}
			color(c = [0.3000000000, 0.3000000000, 1]) {
				translate(v = [0, 0, 2616.1000000000]) {
					linear_extrude(height = 360.0000000000) {
						polygon(paths = [[0, 1, 2, 3]], points = [[0, -240], [0, 240], [2300, 240], [2300, -240]]);
					}
				}
			}
			color(c = [0.3000000000, 0.3000000000, 1]) {
				translate(v = [0, 0, 2616.1000000000]) {
					linear_extrude(height = 360.0000000000) {
						polygon(paths = [[0, 1, 2, 3]], points = [[0, 2480], [0, 2960], [2300, 2960], [2300, 2480]]);
					}
				}
			}
		}
	}
}
